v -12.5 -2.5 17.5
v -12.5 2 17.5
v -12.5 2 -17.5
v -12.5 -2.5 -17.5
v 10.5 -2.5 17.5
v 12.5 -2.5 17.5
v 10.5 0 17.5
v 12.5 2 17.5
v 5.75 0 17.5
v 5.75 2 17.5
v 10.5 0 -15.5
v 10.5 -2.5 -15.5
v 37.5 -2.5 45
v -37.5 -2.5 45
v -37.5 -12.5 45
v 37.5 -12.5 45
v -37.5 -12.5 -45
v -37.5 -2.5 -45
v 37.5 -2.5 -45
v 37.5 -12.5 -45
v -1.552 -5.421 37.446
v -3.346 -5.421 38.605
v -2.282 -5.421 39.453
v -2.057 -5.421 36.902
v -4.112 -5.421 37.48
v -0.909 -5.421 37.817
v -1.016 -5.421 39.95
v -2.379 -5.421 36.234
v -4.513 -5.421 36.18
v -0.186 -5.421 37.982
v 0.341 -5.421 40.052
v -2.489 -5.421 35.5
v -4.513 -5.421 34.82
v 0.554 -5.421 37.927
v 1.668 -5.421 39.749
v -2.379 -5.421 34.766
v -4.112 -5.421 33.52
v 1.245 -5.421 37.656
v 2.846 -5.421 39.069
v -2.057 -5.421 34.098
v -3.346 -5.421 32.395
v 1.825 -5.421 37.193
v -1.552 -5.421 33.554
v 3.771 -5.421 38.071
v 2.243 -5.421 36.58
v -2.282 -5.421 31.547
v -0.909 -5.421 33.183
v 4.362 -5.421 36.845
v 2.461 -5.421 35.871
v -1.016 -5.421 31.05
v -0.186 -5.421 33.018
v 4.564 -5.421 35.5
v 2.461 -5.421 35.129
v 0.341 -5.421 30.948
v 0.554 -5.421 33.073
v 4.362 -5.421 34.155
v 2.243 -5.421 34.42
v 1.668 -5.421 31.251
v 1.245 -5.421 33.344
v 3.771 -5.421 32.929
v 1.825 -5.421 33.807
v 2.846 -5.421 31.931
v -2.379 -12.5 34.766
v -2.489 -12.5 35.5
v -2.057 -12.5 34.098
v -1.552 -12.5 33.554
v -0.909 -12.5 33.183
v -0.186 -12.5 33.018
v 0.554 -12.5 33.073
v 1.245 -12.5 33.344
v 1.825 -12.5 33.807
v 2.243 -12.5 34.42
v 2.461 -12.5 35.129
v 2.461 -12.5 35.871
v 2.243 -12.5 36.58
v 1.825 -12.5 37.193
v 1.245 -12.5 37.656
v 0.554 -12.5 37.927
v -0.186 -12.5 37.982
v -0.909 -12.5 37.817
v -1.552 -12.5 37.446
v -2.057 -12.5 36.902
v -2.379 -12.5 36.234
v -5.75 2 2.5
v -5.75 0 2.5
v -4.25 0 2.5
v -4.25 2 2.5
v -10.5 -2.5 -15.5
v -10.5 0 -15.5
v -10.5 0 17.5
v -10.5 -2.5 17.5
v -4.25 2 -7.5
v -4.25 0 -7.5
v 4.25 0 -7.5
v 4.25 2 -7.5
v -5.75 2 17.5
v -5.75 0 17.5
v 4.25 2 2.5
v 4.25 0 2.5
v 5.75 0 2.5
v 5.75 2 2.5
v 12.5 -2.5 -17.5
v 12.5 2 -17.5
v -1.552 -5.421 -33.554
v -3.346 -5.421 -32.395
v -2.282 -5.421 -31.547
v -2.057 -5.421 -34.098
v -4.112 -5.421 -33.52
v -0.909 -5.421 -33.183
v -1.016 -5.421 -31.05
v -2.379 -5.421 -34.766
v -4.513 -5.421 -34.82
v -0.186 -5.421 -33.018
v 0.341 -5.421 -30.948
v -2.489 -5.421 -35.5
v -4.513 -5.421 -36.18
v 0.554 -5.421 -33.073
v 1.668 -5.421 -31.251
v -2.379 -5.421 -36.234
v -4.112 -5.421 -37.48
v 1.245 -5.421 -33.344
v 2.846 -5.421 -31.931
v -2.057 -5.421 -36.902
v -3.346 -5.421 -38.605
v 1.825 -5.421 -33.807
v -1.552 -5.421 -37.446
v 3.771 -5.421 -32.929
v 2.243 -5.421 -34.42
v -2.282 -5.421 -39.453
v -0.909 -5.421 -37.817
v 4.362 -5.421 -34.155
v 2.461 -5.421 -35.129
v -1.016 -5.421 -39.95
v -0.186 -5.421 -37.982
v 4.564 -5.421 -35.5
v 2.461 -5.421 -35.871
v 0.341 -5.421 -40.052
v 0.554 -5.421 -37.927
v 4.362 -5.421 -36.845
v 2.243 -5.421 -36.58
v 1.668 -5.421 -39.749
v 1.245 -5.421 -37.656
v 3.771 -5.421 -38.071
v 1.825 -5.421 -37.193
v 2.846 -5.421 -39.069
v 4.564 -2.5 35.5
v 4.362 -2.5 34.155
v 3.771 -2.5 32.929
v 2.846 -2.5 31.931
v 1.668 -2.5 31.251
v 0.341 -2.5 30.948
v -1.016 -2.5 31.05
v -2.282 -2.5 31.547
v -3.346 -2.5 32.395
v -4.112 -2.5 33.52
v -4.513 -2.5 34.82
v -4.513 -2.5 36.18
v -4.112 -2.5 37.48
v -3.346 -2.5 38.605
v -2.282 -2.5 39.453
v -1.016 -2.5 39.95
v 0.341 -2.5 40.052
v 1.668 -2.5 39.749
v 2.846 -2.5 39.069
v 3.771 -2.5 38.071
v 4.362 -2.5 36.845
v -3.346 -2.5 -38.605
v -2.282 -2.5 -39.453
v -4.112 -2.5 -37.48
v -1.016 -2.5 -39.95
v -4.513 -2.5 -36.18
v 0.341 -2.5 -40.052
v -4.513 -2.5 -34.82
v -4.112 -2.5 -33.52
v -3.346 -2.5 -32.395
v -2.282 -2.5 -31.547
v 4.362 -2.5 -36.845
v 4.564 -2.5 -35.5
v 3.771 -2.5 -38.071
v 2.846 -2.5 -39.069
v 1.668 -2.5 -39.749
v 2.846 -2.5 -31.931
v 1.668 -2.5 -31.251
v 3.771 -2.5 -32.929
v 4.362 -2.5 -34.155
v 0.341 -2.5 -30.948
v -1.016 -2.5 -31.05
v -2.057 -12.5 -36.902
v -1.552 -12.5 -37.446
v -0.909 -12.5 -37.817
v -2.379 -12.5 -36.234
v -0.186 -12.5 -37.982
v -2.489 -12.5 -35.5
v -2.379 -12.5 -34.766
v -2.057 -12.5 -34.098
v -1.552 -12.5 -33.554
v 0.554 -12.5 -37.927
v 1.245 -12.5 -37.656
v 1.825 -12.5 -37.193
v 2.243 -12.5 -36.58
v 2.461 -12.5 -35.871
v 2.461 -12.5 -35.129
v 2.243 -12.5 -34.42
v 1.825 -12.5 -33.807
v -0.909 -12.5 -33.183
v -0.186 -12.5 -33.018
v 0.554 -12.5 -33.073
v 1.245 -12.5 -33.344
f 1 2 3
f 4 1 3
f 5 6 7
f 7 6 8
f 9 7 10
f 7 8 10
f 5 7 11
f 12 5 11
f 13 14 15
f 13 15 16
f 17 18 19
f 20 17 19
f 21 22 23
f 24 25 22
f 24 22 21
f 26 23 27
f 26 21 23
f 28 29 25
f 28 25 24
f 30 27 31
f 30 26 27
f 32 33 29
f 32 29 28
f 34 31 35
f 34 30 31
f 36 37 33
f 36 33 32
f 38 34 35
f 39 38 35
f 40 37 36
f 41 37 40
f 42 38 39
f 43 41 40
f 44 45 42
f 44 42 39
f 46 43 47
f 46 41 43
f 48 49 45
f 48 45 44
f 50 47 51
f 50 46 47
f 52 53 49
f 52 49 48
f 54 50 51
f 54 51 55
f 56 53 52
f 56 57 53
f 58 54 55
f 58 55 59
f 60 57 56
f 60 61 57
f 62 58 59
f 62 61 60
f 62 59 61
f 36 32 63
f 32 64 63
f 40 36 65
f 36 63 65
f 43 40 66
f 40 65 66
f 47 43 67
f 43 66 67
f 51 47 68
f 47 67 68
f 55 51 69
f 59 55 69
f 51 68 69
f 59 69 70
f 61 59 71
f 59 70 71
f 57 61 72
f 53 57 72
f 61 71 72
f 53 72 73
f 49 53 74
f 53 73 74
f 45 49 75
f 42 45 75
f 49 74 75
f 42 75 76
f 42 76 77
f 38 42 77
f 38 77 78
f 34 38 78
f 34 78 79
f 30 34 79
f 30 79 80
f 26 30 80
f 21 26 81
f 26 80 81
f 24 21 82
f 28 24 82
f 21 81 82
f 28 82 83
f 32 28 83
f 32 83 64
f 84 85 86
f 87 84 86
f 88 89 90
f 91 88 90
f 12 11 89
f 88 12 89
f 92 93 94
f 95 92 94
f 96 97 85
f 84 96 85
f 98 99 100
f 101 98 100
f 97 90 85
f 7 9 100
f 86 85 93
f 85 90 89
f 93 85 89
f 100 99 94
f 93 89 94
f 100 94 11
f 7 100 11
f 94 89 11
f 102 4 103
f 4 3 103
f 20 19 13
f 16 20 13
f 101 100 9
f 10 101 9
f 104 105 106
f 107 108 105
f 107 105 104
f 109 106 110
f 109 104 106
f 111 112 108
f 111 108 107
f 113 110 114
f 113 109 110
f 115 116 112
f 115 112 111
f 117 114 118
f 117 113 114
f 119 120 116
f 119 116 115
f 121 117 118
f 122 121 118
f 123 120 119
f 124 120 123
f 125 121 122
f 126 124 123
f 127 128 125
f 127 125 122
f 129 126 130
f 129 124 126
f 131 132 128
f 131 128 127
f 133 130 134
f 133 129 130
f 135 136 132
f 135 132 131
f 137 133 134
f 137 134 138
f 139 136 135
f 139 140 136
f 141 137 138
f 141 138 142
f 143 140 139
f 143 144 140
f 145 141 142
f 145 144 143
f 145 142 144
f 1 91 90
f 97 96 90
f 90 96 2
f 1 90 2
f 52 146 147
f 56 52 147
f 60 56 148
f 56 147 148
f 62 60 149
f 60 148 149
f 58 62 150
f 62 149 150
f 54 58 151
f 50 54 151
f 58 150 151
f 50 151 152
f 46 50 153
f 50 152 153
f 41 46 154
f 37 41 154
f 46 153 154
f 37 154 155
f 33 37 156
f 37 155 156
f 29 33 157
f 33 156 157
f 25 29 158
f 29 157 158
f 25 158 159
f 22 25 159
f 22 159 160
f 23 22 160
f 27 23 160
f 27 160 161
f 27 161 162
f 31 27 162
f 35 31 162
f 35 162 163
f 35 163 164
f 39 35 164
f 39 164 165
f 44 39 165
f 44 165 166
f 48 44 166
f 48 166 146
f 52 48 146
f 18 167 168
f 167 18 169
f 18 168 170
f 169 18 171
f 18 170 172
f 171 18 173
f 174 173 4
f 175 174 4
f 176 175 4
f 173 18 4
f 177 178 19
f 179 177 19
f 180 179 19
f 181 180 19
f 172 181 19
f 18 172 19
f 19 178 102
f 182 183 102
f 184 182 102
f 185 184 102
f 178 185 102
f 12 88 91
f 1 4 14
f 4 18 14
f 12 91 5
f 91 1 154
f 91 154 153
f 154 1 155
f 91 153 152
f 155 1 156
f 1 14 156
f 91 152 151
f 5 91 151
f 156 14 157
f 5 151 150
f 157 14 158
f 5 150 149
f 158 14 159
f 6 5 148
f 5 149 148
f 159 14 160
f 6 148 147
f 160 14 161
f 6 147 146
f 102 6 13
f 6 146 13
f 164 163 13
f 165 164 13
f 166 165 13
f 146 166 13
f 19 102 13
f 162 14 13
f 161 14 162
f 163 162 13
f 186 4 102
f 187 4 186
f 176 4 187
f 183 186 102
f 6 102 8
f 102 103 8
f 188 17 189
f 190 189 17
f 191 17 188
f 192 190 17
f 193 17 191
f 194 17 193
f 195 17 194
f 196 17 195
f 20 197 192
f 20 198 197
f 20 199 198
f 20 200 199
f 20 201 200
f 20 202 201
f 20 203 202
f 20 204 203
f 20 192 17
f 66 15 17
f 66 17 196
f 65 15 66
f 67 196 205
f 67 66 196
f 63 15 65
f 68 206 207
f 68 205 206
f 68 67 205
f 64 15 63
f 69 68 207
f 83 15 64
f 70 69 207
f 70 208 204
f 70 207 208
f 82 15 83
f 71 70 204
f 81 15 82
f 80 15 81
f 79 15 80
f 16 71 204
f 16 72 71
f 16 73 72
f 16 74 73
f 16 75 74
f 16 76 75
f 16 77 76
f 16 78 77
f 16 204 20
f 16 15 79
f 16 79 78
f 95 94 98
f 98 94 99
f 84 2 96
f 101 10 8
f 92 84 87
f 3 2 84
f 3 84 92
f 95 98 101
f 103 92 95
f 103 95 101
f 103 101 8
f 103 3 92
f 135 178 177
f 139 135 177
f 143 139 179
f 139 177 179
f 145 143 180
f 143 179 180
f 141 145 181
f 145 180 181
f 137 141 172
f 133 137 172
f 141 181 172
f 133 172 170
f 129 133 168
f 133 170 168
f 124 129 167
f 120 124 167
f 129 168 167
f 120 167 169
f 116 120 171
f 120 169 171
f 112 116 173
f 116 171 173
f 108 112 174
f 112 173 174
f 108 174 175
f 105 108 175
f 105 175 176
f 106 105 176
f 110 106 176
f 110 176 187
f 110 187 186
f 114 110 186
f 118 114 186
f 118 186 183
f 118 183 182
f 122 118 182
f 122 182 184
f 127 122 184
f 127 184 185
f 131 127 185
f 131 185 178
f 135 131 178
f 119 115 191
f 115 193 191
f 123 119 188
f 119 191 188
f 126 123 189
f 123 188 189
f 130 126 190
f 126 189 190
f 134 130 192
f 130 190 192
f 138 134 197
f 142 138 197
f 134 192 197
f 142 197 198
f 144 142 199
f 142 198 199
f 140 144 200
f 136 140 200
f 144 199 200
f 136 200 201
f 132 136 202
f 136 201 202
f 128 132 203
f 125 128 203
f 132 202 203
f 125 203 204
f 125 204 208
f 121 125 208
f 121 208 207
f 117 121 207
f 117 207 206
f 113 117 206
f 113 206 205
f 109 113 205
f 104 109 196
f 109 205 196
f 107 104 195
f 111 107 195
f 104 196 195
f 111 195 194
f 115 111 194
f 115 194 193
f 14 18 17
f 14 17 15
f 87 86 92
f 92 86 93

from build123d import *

# Parameters (mm, degrees)
BOSS_EXTRUDE1_DEPTH                             = 2
BOSS_EXTRUDE2_DEPTH                             = 2.5
SKETCH3_W                                       = 75
SKETCH3_H                                       = 90
BOSS_EXTRUDE3_DEPTH                             = 10
CBORE_FOR_8_PAN_HEAD_MACHINE_SCREW1_D           = 4.9784
CBORE_FOR_8_PAN_HEAD_MACHINE_SCREW1_CBORE_D     = 9.12876
CBORE_FOR_8_PAN_HEAD_MACHINE_SCREW1_CBORE_DEPTH = 2.921


with BuildPart() as part:
    # Sketch1 → Boss-Extrude1 (new body)
    with BuildSketch(Plane(origin=(0, 0, 0), x_dir=(1, 0, 0), z_dir=(0, 1, 0))):
        Polygon((12.5, 17.5), (-12.5, 17.5), (-12.5, -17.5), (-5.75, -17.5), (-5.75, -2.5), (-4.25, -2.5), (-4.25, 7.5), (4.25, 7.5), (4.25, -2.5), (5.75, -2.5), (5.75, -17.5), (12.5, -17.5), align=None)
    extrude(amount=BOSS_EXTRUDE1_DEPTH)

    # Sketch2 → Boss-Extrude2 (add)
    with BuildSketch(Plane.XZ):
        Polygon((-12.5, 17.5), (-12.5, -17.5), (12.5, -17.5), (12.5, 17.5), (10.5, 17.5), (10.5, -15.5), (-10.5, -15.5), (-10.5, 17.5), align=None)
    extrude(amount=BOSS_EXTRUDE2_DEPTH)

    # Sketch3 → Boss-Extrude3 (add)
    with BuildSketch(Plane.XZ.offset(2.5)):
        Rectangle(SKETCH3_W, SKETCH3_H)
    extrude(amount=BOSS_EXTRUDE3_DEPTH)

    # CBORE for #8 Pan Head Machine Screw1 (through all)
    with Locations(Plane(origin=(0, -2.5, 0), x_dir=(1, 0, 0), z_dir=(0, 1, 0))):
        with Locations((0, 35.5), (0, -35.5)):
            CounterBoreHole(CBORE_FOR_8_PAN_HEAD_MACHINE_SCREW1_D / 2, CBORE_FOR_8_PAN_HEAD_MACHINE_SCREW1_CBORE_D / 2, CBORE_FOR_8_PAN_HEAD_MACHINE_SCREW1_CBORE_DEPTH)


solid = part.part
